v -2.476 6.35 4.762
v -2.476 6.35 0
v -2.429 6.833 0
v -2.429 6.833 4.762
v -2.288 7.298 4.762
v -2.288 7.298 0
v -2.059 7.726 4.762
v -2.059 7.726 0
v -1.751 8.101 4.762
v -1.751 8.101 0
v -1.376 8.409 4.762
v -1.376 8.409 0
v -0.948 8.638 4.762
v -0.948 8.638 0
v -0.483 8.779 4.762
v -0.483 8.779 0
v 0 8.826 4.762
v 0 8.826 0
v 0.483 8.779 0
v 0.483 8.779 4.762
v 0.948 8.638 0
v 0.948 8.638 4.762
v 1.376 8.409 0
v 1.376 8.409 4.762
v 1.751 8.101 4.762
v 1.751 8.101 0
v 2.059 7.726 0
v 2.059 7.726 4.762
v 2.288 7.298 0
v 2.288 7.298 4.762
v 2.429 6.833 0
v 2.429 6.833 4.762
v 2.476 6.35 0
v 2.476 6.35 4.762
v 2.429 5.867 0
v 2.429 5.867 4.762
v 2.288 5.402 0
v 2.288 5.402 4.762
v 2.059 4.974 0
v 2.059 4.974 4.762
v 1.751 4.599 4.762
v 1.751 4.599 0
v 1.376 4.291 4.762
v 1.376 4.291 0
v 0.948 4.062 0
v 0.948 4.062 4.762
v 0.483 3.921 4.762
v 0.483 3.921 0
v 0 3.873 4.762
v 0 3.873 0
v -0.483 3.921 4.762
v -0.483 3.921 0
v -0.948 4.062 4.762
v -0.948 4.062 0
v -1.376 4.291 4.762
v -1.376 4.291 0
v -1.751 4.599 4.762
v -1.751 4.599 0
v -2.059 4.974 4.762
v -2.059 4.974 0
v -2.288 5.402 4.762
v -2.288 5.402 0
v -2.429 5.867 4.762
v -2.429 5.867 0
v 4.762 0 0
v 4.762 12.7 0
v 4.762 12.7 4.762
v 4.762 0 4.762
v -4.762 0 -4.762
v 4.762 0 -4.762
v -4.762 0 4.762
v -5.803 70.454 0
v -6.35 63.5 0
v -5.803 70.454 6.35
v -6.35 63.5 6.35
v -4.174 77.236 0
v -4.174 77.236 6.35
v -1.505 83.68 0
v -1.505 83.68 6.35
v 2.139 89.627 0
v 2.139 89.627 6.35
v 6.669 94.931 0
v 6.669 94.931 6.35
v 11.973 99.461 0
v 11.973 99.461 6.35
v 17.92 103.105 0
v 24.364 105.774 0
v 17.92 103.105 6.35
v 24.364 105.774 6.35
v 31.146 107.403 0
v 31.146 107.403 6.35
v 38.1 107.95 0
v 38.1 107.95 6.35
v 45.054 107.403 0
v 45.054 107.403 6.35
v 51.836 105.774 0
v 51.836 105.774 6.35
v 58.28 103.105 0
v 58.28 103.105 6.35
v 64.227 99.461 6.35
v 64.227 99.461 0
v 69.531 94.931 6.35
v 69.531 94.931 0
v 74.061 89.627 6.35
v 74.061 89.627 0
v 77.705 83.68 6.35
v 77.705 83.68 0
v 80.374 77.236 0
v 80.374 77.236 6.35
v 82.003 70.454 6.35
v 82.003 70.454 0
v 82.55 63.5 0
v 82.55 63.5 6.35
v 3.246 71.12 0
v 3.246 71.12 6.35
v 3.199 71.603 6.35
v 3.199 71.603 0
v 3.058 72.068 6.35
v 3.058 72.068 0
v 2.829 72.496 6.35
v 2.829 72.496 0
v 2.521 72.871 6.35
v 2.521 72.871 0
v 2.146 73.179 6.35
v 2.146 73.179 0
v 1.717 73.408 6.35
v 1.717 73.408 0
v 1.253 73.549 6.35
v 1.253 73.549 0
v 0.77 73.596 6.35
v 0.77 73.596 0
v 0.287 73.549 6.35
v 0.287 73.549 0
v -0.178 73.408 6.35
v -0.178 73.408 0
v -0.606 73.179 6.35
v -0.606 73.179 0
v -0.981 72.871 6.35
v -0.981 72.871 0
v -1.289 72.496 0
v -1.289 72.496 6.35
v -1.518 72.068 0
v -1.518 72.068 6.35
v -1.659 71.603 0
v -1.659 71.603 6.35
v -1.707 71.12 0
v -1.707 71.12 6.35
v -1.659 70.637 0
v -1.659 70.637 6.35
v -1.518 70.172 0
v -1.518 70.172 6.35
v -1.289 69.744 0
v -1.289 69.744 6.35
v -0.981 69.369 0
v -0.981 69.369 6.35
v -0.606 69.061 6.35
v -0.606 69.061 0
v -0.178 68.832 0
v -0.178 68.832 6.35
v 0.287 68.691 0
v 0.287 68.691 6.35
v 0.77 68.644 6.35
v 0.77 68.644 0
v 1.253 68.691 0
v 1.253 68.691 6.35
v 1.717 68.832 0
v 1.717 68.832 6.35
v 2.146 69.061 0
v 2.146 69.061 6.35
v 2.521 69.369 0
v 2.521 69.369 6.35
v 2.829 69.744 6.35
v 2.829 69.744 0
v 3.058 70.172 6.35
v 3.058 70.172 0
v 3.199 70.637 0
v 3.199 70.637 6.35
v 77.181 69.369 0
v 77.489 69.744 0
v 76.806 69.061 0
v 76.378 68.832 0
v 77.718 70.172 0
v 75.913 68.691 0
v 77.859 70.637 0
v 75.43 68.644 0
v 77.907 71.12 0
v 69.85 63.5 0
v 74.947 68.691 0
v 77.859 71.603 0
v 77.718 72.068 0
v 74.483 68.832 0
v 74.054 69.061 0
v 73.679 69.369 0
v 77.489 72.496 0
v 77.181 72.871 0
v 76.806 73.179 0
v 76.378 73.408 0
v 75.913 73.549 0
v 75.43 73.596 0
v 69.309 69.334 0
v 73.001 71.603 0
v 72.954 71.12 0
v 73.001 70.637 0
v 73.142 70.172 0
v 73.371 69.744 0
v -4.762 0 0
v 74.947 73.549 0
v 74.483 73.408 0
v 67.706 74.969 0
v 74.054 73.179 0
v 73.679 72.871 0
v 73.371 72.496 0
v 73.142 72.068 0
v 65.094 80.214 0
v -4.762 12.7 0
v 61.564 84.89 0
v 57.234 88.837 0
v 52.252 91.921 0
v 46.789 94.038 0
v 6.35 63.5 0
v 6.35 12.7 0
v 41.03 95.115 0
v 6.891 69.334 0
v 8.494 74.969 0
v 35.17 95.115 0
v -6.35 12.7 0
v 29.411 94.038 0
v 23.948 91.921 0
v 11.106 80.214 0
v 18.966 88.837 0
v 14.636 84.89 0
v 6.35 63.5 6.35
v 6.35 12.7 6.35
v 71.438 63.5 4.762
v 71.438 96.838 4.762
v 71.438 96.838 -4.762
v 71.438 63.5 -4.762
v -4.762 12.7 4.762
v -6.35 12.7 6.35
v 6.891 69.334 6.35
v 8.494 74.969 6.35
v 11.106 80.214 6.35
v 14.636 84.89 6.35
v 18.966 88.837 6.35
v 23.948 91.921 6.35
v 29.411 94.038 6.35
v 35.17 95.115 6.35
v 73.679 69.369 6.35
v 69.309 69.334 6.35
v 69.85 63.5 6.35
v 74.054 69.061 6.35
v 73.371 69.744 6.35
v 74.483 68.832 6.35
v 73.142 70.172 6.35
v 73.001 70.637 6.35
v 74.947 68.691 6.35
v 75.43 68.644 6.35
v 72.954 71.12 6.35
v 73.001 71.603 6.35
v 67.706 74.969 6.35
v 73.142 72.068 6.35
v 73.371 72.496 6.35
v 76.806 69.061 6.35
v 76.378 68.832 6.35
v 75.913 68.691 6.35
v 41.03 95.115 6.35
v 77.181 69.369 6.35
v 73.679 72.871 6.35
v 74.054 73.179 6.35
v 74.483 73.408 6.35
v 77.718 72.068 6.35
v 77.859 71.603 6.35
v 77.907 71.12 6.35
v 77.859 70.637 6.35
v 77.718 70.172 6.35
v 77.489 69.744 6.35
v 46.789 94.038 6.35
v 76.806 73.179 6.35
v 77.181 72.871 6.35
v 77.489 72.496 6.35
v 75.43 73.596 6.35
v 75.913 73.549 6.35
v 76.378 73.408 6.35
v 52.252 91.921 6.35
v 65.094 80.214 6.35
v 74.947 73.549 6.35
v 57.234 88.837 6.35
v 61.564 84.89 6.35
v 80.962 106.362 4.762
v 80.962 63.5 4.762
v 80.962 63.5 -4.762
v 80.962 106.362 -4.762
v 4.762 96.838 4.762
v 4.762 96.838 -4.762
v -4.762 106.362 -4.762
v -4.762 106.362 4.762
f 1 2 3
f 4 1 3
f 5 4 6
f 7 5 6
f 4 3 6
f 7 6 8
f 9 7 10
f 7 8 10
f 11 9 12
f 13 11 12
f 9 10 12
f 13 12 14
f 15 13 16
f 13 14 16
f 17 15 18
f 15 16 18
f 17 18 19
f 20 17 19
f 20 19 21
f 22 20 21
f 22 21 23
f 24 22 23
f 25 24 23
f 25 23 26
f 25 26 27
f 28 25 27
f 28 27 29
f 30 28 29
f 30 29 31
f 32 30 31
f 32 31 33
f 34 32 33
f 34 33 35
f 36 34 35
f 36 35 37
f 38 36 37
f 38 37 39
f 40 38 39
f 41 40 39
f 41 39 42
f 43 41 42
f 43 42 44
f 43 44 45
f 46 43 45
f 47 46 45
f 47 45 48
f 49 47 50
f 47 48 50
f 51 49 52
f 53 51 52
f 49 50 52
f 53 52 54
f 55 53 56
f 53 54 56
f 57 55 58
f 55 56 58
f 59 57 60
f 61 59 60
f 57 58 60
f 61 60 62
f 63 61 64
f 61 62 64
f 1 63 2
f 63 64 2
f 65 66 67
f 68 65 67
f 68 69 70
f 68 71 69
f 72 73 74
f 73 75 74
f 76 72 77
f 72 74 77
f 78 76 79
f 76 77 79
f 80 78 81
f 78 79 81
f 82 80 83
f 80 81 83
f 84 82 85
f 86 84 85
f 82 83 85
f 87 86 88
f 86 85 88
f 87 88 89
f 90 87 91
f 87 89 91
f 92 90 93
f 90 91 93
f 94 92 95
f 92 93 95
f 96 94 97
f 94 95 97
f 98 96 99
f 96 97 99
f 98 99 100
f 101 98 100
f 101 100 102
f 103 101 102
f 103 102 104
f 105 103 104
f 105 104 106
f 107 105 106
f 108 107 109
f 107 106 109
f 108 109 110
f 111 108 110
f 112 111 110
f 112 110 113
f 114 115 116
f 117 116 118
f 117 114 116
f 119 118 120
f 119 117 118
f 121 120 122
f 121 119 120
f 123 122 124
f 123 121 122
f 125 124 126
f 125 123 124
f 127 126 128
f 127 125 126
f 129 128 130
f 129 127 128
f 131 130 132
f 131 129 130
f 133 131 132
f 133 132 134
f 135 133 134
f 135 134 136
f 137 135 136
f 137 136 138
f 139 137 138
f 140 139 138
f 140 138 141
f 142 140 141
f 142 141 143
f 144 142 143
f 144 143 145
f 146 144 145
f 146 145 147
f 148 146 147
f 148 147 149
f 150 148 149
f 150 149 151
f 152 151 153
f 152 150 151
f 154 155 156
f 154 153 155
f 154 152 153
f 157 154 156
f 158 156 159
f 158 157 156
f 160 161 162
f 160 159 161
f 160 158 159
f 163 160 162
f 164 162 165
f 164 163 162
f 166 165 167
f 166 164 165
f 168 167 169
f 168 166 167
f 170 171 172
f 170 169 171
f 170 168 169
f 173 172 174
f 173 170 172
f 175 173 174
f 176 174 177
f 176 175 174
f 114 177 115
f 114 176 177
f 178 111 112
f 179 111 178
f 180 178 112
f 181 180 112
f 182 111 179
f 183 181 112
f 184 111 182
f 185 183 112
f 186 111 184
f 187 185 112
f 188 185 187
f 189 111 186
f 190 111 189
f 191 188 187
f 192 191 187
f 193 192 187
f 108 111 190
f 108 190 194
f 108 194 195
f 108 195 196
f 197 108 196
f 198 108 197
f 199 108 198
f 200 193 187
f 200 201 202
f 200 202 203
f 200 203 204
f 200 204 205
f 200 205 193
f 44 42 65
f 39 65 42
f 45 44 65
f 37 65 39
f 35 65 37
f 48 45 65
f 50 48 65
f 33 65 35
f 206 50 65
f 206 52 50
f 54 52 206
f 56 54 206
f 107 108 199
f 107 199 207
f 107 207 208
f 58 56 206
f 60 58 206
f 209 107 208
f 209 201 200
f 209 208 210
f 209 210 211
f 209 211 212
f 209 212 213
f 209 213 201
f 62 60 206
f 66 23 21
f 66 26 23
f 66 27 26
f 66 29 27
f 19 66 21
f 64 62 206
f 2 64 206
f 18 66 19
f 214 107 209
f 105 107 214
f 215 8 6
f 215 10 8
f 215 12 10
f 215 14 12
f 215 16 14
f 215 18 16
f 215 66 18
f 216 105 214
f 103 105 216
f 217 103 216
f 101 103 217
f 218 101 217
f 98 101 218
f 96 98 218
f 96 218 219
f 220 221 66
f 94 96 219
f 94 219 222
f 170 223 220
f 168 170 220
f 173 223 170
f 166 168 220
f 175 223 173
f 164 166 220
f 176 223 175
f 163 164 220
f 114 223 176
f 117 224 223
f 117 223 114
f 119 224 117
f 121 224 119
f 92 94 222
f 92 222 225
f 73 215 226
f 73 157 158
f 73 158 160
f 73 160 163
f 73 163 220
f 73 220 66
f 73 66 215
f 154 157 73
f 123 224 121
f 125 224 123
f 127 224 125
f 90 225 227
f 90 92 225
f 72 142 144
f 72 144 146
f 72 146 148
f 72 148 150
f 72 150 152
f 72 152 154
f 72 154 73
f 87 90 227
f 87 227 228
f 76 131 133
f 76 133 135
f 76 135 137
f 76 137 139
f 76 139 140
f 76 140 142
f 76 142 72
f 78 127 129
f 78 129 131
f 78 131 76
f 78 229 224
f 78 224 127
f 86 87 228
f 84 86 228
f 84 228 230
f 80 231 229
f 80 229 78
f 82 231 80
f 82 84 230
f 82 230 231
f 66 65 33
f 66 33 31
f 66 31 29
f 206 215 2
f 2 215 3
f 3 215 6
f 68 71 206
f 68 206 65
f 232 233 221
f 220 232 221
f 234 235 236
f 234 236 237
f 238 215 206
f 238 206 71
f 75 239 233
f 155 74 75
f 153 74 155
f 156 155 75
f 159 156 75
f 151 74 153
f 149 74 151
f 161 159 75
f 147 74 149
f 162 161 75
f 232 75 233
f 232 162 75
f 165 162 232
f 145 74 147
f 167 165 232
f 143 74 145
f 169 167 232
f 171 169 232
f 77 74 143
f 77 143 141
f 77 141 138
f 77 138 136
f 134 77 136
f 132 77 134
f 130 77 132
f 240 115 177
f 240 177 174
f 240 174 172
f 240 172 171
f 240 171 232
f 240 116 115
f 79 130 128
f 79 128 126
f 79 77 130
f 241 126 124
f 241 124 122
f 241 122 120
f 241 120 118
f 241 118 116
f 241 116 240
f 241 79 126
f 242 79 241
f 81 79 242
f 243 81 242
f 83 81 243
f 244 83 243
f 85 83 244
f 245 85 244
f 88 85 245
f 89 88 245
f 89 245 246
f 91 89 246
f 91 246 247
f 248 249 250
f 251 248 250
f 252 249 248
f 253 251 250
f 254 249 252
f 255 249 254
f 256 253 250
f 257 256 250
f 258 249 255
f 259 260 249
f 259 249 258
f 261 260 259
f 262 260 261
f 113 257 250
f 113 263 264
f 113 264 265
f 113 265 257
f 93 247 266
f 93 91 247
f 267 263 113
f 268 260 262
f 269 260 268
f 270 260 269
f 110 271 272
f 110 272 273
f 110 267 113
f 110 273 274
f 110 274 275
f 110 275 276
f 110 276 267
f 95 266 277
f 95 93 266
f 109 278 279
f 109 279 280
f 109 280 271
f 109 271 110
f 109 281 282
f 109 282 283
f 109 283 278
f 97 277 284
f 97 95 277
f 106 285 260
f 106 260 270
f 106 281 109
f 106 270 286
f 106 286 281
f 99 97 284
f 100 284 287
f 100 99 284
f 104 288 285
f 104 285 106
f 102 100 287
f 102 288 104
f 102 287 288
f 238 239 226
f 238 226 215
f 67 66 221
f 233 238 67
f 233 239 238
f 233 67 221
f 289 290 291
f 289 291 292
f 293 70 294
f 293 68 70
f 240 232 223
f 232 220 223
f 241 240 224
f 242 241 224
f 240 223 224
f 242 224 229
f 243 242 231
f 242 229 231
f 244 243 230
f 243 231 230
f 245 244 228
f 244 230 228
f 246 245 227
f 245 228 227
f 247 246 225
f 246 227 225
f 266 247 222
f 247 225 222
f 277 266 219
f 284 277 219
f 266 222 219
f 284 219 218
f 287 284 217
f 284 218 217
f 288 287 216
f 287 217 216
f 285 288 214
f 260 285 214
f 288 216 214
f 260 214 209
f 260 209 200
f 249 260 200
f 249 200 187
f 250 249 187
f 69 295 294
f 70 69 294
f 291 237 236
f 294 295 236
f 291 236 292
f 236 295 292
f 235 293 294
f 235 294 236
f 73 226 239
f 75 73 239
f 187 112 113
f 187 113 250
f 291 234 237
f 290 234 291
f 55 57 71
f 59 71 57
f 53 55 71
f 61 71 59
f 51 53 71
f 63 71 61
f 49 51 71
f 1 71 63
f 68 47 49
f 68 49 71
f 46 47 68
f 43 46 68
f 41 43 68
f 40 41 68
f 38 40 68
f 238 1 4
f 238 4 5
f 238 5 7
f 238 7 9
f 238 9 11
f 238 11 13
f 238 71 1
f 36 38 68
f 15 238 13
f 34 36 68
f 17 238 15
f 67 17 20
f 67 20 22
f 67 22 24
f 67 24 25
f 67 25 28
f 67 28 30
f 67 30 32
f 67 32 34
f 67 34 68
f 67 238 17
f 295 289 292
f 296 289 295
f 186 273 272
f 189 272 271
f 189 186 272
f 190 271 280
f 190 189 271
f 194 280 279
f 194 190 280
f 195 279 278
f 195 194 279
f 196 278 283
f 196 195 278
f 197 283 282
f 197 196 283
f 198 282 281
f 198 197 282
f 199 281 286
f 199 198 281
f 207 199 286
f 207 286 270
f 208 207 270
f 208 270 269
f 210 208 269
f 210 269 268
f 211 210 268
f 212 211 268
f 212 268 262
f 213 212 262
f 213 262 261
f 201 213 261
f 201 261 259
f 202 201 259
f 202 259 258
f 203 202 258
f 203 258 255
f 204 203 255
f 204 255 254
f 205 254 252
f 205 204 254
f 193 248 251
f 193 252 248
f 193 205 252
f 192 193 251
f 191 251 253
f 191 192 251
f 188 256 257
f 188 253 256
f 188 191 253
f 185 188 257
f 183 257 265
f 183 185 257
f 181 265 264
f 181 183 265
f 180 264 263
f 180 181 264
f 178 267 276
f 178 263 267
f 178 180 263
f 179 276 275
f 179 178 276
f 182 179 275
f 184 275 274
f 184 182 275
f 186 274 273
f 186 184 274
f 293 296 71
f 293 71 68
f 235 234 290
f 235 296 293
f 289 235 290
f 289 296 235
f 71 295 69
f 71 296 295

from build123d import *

# Parameters (mm, degrees)
EXTRUDE_THIN3_DEPTH = 4.7625
SKETCH38_W          = 12.7
SKETCH38_H          = 6.35
SKETCH39_R          = 2.4765
CUT_EXTRUDE1_DEPTH  = 7.35
SKETCH42_W          = 12.7
SKETCH42_H          = 6.35
CUT_EXTRUDE2_DEPTH  = 12.7
SKETCH43_W          = 9.525
SKETCH43_H          = 4.7625
BOSS_EXTRUDE4_DEPTH = 12.7
SKETCH45_R          = 2.4765
CUT_EXTRUDE4_DEPTH  = 7.35


with BuildPart() as part:
    # Sketch8 → Extrude-Thin3 (new body, symmetric)
    with BuildSketch(Plane.XY):
        Polygon((4.7625, 0), (4.7625, 96.8375), (71.4375, 96.8375), (71.4375, 63.5), (80.9625, 63.5), (80.9625, 106.3625), (-4.7625, 106.3625), (-4.7625, 0), align=None)
    extrude(amount=EXTRUDE_THIN3_DEPTH, both=True)


with BuildPart() as body_2:
    # Sweep5: sweep along a path in Sketch37
    with BuildLine(Plane.XY) as sweep5_path:
        Line((0, 0), (0, 63.5))
        ThreePointArc((0, 63.5), (38.1, 101.6), (76.2, 63.5))
    # Sketch38 → Sweep5 (sweep)
    with BuildSketch(Plane(origin=(0, 0, 0), x_dir=(1, 0, 0), z_dir=(0, 1, 0))):
        with Locations((0, -3.175)):
            Rectangle(SKETCH38_W, SKETCH38_H)
    sweep(path=sweep5_path.line)

    # Sketch39 → Cut-Extrude1 (cut, through all)
    with BuildSketch(Plane.XY):
        with Locations((75.43022368, 71.12)):
            Circle(SKETCH39_R)
        with Locations((0.76977632, 71.12)):
            Circle(SKETCH39_R)
    extrude(amount=CUT_EXTRUDE1_DEPTH, mode=Mode.SUBTRACT)

    # Sketch42 → Cut-Extrude2 (cut)
    with BuildSketch(Plane.XZ):
        with Locations((0, 3.175)):
            Rectangle(SKETCH42_W, SKETCH42_H)
    extrude(amount=-CUT_EXTRUDE2_DEPTH, mode=Mode.SUBTRACT)

    # Sketch43 → Boss-Extrude4 (add)
    with BuildSketch(Plane.XZ.offset(-12.7)):
        with Locations((0, 2.38125)):
            Rectangle(SKETCH43_W, SKETCH43_H)
    extrude(amount=BOSS_EXTRUDE4_DEPTH)

    # Sketch45 → Cut-Extrude4 (cut, through all)
    with BuildSketch(Plane(origin=(0, 0, 0), x_dir=(-1, 0, 0), z_dir=(0, 0, -1))):
        with Locations((0, 6.35)):
            Circle(SKETCH45_R)
    extrude(amount=-CUT_EXTRUDE4_DEPTH, mode=Mode.SUBTRACT)


solid = Compound([part.part, body_2.part])
